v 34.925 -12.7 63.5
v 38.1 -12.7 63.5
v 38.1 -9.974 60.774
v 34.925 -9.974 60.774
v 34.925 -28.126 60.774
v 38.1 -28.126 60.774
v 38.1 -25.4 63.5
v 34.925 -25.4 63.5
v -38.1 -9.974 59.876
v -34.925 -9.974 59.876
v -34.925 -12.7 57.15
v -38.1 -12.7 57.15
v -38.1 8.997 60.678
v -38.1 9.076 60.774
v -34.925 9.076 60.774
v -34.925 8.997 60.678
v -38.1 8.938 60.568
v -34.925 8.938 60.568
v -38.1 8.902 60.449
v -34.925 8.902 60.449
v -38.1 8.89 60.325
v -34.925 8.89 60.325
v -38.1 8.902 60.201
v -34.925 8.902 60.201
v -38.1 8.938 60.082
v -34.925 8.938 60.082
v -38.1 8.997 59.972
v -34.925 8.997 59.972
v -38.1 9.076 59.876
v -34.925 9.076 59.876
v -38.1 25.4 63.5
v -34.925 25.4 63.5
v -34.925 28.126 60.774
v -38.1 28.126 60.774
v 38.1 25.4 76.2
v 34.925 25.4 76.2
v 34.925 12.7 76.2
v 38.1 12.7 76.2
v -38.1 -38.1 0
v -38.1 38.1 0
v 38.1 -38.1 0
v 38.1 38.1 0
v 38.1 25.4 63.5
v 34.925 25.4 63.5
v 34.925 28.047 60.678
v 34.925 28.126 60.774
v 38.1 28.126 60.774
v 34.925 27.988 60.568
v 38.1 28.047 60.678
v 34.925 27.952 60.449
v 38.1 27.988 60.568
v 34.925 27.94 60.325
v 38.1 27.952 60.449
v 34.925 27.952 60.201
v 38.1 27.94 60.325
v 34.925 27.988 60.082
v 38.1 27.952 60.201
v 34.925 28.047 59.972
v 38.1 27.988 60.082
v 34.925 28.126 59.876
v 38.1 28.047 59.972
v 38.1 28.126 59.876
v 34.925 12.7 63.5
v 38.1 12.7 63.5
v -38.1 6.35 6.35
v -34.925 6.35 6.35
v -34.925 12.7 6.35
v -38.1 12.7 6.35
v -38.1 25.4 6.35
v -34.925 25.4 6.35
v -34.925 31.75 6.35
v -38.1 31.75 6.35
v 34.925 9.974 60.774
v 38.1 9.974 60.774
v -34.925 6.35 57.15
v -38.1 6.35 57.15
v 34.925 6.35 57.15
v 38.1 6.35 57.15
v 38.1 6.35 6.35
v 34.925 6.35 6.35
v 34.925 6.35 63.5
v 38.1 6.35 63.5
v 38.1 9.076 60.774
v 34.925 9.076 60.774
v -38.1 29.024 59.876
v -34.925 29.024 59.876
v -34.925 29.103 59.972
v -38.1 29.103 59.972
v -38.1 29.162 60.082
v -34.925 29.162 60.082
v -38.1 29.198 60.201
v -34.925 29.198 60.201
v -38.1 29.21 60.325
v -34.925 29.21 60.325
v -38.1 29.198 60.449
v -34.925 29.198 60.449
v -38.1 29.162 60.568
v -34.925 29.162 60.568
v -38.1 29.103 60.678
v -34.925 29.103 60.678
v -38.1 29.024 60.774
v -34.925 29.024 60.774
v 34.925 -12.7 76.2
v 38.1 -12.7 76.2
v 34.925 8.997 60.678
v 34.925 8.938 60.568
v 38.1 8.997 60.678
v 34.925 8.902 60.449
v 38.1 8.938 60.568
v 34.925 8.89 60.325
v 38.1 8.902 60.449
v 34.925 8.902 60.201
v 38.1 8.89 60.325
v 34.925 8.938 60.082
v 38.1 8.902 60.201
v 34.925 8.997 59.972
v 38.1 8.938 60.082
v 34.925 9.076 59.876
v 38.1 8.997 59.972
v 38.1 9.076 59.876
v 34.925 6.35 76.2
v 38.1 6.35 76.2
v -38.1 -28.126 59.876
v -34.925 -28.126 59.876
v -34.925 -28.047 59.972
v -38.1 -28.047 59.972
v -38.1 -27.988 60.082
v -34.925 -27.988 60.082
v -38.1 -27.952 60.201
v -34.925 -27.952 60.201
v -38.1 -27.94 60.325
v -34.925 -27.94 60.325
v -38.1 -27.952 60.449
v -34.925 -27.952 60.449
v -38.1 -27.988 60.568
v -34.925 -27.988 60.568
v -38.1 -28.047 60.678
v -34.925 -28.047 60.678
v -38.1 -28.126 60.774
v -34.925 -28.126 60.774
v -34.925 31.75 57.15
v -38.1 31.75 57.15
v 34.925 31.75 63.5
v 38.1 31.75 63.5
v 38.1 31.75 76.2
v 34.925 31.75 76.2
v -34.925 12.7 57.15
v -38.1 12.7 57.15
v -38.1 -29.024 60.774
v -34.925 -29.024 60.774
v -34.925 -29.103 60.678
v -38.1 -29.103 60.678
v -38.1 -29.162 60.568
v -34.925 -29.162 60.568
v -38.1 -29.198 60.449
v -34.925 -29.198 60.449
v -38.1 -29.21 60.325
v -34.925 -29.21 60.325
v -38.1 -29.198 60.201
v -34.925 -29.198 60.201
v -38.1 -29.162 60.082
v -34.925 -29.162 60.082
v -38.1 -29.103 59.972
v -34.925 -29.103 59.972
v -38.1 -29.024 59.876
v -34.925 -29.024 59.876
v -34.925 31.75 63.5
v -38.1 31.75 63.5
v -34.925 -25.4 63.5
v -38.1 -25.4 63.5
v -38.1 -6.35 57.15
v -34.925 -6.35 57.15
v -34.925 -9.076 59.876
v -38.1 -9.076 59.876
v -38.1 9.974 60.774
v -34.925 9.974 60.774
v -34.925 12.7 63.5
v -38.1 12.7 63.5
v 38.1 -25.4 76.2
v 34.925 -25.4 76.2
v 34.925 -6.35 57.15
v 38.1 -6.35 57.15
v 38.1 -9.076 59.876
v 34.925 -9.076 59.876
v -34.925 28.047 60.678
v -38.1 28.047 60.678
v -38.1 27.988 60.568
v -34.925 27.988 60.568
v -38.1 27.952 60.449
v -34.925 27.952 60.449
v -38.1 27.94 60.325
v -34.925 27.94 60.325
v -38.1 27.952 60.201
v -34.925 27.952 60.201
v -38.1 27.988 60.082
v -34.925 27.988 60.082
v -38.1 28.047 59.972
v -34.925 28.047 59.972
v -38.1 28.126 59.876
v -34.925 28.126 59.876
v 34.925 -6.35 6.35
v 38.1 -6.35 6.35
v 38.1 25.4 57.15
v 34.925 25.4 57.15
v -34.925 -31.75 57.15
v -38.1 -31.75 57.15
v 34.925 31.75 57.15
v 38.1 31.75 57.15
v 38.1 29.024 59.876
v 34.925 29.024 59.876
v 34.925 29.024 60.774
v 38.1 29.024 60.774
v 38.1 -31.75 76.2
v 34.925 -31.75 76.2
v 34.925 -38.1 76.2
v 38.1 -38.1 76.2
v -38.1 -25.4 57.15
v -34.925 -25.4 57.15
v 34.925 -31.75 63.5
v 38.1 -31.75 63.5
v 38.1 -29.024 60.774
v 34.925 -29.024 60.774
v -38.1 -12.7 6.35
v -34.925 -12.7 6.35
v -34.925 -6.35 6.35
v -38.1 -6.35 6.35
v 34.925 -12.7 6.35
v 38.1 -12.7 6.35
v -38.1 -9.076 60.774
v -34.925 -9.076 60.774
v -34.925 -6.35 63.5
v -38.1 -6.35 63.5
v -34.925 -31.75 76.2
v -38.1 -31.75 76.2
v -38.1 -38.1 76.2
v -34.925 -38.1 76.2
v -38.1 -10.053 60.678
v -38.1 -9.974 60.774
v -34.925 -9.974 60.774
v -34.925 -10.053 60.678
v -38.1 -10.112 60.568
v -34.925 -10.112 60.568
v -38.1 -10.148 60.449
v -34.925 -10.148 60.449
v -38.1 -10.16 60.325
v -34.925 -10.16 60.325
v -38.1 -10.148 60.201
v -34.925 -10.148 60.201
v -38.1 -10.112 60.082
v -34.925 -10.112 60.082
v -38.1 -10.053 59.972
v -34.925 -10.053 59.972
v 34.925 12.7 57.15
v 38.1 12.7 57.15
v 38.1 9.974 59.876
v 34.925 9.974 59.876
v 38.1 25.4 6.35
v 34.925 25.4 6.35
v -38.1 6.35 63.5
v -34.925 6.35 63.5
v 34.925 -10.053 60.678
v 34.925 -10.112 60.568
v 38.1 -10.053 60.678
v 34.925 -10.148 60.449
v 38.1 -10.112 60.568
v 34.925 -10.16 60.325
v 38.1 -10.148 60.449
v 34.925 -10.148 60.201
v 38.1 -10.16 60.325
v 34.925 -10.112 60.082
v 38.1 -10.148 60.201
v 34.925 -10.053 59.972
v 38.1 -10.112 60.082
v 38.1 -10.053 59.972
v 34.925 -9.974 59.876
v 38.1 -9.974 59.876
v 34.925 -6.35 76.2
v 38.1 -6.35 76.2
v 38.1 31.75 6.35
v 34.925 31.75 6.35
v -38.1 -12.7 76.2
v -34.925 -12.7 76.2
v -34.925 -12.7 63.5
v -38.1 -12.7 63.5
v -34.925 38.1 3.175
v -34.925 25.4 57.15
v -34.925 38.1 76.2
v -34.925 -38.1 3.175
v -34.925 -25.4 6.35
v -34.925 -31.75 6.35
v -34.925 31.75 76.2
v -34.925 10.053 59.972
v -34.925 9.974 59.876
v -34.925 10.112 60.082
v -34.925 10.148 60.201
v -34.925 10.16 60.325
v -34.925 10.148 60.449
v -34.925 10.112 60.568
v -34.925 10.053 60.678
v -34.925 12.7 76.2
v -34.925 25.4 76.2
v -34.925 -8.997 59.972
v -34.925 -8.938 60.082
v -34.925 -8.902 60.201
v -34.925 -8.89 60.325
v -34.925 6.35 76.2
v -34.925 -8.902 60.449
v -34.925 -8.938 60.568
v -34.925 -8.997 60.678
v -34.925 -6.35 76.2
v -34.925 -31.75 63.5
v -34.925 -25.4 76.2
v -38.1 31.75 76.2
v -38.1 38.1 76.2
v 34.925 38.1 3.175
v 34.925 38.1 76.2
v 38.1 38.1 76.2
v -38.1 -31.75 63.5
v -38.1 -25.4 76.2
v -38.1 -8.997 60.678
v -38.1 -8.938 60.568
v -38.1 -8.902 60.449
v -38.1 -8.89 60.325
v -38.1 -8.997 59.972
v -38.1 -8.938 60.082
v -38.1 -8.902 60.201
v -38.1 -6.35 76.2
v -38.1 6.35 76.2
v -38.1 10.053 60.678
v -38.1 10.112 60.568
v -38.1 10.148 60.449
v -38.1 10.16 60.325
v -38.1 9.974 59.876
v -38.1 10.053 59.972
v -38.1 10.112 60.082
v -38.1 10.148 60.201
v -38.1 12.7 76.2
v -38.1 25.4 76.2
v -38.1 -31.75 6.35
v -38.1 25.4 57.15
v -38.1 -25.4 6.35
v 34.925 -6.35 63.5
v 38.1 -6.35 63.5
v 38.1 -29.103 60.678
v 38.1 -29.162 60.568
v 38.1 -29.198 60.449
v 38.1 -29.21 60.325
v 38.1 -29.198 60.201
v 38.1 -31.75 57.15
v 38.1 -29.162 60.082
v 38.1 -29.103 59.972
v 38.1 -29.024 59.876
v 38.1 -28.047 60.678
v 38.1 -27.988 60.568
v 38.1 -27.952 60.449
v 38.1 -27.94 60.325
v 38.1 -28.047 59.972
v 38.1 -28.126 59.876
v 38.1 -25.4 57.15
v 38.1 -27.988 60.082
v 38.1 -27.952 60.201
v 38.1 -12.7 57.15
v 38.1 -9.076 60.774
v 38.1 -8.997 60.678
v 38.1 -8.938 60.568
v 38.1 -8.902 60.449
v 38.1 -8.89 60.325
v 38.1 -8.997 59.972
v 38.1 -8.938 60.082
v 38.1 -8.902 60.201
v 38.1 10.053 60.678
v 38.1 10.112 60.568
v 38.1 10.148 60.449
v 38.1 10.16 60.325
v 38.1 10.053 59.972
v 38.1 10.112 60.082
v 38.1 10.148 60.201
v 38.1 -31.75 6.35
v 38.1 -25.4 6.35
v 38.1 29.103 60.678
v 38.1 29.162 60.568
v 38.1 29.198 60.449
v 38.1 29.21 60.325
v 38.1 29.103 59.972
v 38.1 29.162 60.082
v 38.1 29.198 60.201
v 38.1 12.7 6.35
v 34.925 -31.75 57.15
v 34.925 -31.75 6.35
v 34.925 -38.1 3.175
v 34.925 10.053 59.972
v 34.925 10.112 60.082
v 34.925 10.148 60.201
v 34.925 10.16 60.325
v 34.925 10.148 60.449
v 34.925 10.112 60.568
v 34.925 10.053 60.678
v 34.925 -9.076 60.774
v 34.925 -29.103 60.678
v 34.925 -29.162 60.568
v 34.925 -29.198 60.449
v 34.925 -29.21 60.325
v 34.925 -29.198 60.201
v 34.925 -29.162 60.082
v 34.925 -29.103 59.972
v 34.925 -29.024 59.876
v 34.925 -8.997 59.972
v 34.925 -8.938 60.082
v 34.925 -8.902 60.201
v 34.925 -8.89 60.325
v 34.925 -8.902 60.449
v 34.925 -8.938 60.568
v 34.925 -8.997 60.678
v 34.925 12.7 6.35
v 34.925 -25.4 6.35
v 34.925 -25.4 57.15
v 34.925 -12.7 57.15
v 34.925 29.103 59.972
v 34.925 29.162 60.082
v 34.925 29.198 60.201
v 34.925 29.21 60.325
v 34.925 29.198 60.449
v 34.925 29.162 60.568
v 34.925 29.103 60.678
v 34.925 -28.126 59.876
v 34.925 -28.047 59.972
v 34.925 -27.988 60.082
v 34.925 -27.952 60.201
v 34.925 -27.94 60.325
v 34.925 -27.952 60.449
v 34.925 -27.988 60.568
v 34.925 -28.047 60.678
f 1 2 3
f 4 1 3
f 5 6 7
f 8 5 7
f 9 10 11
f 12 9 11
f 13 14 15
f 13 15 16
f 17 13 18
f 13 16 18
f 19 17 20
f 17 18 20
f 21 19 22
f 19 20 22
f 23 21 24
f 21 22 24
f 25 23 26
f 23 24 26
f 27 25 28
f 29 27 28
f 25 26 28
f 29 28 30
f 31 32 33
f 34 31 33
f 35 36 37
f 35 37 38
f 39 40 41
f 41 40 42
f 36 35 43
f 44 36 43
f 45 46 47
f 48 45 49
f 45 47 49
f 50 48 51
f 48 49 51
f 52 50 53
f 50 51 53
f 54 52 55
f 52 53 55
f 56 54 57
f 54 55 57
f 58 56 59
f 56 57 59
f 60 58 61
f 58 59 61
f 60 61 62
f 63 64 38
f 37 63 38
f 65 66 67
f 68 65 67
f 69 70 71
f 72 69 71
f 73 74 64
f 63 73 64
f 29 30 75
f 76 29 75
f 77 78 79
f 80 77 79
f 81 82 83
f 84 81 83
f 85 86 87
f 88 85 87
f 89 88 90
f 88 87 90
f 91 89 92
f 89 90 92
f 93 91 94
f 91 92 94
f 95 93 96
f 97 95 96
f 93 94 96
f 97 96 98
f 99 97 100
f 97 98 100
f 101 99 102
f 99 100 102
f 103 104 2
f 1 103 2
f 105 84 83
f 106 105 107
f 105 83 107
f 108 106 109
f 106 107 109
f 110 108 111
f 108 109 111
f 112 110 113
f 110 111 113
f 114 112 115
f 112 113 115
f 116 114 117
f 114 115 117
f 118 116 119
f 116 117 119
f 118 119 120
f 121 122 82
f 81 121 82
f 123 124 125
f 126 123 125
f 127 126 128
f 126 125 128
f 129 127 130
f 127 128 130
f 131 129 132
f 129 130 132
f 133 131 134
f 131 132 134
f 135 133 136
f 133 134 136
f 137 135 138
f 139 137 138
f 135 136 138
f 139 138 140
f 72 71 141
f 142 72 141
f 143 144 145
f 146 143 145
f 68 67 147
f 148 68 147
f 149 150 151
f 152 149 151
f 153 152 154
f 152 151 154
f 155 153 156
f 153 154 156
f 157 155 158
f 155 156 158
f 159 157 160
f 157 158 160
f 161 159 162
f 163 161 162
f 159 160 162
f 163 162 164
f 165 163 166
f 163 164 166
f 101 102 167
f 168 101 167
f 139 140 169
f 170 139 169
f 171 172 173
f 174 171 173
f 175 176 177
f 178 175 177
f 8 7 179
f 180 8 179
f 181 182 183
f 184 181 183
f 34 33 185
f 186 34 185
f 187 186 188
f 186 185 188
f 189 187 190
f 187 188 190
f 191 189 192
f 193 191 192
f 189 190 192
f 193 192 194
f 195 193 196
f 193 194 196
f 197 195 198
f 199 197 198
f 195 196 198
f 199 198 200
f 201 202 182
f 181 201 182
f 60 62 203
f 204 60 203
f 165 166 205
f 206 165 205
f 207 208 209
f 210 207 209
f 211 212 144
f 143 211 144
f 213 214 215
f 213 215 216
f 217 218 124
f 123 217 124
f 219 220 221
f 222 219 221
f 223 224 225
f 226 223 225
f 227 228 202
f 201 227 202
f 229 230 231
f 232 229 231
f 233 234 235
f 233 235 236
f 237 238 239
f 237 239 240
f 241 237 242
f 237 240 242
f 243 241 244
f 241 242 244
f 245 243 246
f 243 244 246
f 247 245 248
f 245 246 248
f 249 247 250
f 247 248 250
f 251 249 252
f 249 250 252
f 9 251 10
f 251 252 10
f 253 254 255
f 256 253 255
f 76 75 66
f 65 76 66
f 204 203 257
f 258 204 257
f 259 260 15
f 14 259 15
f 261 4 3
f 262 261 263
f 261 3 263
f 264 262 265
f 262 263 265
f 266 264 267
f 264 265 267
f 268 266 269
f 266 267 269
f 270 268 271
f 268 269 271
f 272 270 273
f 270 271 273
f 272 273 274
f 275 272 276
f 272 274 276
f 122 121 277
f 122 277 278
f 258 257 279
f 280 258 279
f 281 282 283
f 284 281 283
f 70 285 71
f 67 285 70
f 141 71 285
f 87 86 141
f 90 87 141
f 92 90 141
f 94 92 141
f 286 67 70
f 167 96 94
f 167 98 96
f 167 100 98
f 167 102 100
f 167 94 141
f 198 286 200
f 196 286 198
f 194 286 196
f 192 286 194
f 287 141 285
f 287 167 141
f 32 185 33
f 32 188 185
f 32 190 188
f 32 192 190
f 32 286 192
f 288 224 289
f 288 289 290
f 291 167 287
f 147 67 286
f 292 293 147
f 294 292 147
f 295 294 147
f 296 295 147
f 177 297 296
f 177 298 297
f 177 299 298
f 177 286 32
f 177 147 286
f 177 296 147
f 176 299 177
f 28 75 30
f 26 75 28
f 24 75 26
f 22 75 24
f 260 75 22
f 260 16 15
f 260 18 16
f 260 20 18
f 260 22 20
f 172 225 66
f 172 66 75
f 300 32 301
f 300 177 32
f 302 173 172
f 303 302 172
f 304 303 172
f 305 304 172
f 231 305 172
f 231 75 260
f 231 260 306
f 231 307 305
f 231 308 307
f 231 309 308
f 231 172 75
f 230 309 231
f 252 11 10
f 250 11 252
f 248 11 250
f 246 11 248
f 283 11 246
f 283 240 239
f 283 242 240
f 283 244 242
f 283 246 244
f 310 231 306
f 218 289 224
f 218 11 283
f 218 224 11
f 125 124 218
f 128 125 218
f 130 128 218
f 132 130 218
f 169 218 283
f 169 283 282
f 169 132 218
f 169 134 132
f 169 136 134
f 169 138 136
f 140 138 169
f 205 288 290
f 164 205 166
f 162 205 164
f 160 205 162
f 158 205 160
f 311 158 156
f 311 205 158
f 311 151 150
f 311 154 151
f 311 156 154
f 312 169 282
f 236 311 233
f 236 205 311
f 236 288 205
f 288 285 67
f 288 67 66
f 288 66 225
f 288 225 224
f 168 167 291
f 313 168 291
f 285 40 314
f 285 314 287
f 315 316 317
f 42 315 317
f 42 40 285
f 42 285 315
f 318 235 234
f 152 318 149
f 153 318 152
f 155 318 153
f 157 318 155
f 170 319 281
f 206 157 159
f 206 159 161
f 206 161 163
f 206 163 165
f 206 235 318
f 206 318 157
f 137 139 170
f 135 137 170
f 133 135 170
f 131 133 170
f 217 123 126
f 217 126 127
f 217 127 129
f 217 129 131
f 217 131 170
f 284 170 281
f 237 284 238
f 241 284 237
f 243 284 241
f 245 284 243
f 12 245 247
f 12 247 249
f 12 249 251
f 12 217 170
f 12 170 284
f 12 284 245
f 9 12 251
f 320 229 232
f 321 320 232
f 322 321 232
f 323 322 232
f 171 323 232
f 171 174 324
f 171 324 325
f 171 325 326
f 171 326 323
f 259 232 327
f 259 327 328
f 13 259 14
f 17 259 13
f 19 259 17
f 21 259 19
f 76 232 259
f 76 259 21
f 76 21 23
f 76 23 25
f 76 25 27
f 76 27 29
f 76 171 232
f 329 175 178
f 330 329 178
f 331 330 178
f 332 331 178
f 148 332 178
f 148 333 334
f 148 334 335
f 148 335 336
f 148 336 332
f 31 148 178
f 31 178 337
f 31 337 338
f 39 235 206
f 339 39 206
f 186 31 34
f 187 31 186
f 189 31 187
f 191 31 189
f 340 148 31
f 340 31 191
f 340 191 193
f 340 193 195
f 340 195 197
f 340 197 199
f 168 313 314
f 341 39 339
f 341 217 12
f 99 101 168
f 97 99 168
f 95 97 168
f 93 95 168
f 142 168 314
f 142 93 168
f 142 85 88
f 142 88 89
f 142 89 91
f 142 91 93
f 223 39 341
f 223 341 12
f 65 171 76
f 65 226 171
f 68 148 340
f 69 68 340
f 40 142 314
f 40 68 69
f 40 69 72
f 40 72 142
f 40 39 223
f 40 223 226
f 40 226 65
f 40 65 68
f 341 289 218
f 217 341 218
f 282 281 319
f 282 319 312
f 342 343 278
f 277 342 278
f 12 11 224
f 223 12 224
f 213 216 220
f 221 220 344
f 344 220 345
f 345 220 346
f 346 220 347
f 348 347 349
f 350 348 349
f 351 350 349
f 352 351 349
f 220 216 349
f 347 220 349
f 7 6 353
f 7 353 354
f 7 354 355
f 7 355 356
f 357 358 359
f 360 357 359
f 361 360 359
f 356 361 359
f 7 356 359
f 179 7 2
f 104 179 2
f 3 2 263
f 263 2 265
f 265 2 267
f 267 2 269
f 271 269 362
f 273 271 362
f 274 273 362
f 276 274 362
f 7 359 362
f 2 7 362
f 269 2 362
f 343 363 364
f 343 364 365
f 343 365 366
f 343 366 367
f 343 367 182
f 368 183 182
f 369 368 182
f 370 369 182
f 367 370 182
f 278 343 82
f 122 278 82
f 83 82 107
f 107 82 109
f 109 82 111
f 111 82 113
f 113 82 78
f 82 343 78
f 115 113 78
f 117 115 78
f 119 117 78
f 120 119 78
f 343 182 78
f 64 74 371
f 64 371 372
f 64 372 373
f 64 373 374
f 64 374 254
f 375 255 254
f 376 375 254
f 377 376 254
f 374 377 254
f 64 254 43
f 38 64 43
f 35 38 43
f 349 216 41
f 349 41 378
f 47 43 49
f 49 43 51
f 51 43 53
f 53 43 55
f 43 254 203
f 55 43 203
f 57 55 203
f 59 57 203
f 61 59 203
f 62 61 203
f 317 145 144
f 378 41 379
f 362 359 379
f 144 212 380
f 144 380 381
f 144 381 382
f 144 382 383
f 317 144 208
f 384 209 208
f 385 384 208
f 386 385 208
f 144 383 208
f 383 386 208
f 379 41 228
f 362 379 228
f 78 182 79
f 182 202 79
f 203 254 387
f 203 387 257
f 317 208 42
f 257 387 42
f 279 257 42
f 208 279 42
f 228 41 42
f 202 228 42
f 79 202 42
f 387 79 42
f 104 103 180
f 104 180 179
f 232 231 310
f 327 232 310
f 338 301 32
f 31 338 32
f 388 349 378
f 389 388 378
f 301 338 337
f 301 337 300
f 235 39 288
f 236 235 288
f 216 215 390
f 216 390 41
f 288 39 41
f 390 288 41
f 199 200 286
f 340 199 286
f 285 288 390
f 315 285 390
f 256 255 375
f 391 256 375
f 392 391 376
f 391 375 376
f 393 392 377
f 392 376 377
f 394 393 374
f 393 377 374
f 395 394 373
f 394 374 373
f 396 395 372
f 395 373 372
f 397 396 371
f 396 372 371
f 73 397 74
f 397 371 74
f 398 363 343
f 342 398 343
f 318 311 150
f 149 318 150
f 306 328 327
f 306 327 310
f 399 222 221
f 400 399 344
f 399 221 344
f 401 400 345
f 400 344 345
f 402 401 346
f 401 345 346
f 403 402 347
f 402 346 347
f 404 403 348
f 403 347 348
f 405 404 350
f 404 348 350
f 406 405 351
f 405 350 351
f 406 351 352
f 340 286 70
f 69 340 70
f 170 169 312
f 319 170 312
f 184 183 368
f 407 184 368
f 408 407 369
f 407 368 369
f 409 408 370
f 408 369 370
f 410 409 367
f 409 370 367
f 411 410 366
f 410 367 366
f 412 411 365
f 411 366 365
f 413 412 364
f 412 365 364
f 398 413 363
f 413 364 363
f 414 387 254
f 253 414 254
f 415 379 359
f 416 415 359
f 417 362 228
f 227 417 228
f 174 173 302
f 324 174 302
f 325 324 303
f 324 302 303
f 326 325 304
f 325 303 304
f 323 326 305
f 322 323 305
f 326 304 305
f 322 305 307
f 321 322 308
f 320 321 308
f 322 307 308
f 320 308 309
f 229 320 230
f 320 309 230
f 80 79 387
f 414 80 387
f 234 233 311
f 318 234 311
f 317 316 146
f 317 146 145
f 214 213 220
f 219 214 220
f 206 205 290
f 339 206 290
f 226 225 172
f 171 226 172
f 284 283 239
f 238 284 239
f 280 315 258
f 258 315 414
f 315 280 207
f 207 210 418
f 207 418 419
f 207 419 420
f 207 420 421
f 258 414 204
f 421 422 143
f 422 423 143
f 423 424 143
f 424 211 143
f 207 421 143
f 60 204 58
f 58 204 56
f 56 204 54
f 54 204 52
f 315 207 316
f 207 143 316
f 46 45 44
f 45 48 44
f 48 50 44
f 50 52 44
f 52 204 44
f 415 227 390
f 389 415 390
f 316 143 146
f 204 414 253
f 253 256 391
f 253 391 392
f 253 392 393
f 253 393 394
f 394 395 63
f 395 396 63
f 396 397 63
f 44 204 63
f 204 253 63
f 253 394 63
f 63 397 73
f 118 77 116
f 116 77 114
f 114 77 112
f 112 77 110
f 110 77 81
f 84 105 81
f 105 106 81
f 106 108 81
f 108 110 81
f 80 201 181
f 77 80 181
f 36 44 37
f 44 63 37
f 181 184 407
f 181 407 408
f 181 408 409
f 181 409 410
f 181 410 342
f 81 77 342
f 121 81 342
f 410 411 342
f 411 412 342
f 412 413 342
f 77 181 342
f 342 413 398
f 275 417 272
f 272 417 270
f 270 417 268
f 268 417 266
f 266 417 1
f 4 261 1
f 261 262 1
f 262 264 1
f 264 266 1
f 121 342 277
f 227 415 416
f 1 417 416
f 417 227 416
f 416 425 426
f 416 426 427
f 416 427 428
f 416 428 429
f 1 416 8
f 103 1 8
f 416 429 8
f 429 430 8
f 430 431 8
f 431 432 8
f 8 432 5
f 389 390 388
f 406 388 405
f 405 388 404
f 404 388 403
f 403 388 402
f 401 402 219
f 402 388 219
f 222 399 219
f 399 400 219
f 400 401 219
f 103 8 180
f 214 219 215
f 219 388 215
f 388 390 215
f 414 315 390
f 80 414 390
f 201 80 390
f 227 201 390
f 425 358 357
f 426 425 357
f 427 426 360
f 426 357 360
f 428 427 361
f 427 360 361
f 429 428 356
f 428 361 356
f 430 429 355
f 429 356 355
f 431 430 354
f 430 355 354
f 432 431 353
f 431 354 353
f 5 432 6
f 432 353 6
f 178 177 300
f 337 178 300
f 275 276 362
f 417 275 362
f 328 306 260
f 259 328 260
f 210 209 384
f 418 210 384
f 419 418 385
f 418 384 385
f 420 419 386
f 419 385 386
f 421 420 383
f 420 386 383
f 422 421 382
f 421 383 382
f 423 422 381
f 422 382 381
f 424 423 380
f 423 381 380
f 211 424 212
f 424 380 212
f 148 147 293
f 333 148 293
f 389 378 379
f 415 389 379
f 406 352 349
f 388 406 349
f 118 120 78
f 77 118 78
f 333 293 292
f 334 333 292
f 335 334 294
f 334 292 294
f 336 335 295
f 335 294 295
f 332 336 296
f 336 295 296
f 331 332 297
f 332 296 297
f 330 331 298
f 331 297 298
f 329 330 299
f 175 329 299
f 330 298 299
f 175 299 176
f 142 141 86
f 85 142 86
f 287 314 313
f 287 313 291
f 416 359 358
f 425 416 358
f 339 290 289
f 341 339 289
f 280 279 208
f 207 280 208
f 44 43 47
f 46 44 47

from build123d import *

# Parameters (mm, degrees)
F0_W     = 76.2
F0_H     = 76.2
F1_DEPTH = 76.2
F3_DEPTH = 131.88104
F4_W     = 69.85
F4_H     = 73.025
F5_DEPTH = 151.50575


with BuildPart() as f1:
    # F0 (on Top) → F1 (new body)
    with BuildSketch(Plane.XY):
        Rectangle(F0_W, F0_H)
    extrude(amount=F1_DEPTH)

    # F2 (on face) → F3 (cut)
    with BuildSketch(Plane.YZ.offset(38.1)):
        with BuildLine():
            Line((-25.4, 63.5), (-25.4, 76.2))
            Line((-25.4, 76.2), (-31.75, 76.2))
            Line((-31.75, 76.2), (-31.75, 63.5))
            Line((-31.75, 63.5), (-29.024013, 60.774013))
            ThreePointArc((-29.024013, 60.774013), (-29.21, 60.325), (-29.024013, 59.875987))
            Line((-29.024013, 59.875987), (-31.75, 57.15))
            Line((-31.75, 57.15), (-31.75, 6.35))
            Line((-31.75, 6.35), (-25.4, 6.35))
            Line((-25.4, 6.35), (-25.4, 57.15))
            Line((-25.4, 57.15), (-28.125987, 59.875987))
            ThreePointArc((-28.125987, 59.875987), (-27.94, 60.325), (-28.125987, 60.774013))
            Line((-28.125987, 60.774013), (-25.4, 63.5))
        make_face()
        with BuildLine():
            Line((-6.35, 63.5), (-6.35, 76.2))
            Line((-6.35, 76.2), (-12.7, 76.2))
            Line((-12.7, 76.2), (-12.7, 63.5))
            Line((-12.7, 63.5), (-9.974013, 60.774013))
            ThreePointArc((-9.974013, 60.774013), (-10.16, 60.325), (-9.974013, 59.875987))
            Line((-9.974013, 59.875987), (-12.7, 57.15))
            Line((-12.7, 57.15), (-12.7, 6.35))
            Line((-12.7, 6.35), (-6.35, 6.35))
            Line((-6.35, 6.35), (-6.35, 57.15))
            Line((-6.35, 57.15), (-9.075987, 59.875987))
            ThreePointArc((-9.075987, 59.875987), (-8.89, 60.325), (-9.075987, 60.774013))
            Line((-9.075987, 60.774013), (-6.35, 63.5))
        make_face()
        with BuildLine():
            Line((12.7, 76.2), (6.35, 76.2))
            Line((6.35, 76.2), (6.35, 63.5))
            Line((6.35, 63.5), (9.075987, 60.774013))
            ThreePointArc((9.075987, 60.774013), (8.89, 60.325), (9.075987, 59.875987))
            Line((9.075987, 59.875987), (6.35, 57.15))
            Line((6.35, 57.15), (6.35, 6.35))
            Line((6.35, 6.35), (12.7, 6.35))
            Line((12.7, 6.35), (12.7, 57.15))
            Line((12.7, 57.15), (9.974013, 59.875987))
            ThreePointArc((9.974013, 59.875987), (10.16, 60.325), (9.974013, 60.774013))
            Line((9.974013, 60.774013), (12.7, 63.5))
            Line((12.7, 63.5), (12.7, 76.2))
        make_face()
        with BuildLine():
            Line((31.75, 76.2), (25.4, 76.2))
            Line((25.4, 76.2), (25.4, 63.5))
            Line((25.4, 63.5), (28.125987, 60.774013))
            ThreePointArc((28.125987, 60.774013), (27.94, 60.325), (28.125987, 59.875987))
            Line((28.125987, 59.875987), (25.4, 57.15))
            Line((25.4, 57.15), (25.4, 6.35))
            Line((25.4, 6.35), (31.75, 6.35))
            Line((31.75, 6.35), (31.75, 57.15))
            Line((31.75, 57.15), (29.024013, 59.875987))
            ThreePointArc((29.024013, 59.875987), (29.21, 60.325), (29.024013, 60.774013))
            Line((29.024013, 60.774013), (31.75, 63.5))
            Line((31.75, 63.5), (31.75, 76.2))
        make_face()
        Polygon((-12.7, 76.2), (-6.35, 76.2), (6.35, 76.2), (12.7, 76.2), (25.4, 76.2), (31.75, 76.2), (31.627543, 85.504442), (-31.75, 85.504442), (-31.75, 76.2), (-25.4, 76.2), align=None)
    extrude(amount=-F3_DEPTH, mode=Mode.SUBTRACT)

    # F4 (on face) → F5 (cut)
    with BuildSketch(Plane.XZ.offset(38.1)):
        with Locations((0, 39.6875)):
            Rectangle(F4_W, F4_H)
    extrude(amount=-F5_DEPTH, mode=Mode.SUBTRACT)


solid = f1.part
